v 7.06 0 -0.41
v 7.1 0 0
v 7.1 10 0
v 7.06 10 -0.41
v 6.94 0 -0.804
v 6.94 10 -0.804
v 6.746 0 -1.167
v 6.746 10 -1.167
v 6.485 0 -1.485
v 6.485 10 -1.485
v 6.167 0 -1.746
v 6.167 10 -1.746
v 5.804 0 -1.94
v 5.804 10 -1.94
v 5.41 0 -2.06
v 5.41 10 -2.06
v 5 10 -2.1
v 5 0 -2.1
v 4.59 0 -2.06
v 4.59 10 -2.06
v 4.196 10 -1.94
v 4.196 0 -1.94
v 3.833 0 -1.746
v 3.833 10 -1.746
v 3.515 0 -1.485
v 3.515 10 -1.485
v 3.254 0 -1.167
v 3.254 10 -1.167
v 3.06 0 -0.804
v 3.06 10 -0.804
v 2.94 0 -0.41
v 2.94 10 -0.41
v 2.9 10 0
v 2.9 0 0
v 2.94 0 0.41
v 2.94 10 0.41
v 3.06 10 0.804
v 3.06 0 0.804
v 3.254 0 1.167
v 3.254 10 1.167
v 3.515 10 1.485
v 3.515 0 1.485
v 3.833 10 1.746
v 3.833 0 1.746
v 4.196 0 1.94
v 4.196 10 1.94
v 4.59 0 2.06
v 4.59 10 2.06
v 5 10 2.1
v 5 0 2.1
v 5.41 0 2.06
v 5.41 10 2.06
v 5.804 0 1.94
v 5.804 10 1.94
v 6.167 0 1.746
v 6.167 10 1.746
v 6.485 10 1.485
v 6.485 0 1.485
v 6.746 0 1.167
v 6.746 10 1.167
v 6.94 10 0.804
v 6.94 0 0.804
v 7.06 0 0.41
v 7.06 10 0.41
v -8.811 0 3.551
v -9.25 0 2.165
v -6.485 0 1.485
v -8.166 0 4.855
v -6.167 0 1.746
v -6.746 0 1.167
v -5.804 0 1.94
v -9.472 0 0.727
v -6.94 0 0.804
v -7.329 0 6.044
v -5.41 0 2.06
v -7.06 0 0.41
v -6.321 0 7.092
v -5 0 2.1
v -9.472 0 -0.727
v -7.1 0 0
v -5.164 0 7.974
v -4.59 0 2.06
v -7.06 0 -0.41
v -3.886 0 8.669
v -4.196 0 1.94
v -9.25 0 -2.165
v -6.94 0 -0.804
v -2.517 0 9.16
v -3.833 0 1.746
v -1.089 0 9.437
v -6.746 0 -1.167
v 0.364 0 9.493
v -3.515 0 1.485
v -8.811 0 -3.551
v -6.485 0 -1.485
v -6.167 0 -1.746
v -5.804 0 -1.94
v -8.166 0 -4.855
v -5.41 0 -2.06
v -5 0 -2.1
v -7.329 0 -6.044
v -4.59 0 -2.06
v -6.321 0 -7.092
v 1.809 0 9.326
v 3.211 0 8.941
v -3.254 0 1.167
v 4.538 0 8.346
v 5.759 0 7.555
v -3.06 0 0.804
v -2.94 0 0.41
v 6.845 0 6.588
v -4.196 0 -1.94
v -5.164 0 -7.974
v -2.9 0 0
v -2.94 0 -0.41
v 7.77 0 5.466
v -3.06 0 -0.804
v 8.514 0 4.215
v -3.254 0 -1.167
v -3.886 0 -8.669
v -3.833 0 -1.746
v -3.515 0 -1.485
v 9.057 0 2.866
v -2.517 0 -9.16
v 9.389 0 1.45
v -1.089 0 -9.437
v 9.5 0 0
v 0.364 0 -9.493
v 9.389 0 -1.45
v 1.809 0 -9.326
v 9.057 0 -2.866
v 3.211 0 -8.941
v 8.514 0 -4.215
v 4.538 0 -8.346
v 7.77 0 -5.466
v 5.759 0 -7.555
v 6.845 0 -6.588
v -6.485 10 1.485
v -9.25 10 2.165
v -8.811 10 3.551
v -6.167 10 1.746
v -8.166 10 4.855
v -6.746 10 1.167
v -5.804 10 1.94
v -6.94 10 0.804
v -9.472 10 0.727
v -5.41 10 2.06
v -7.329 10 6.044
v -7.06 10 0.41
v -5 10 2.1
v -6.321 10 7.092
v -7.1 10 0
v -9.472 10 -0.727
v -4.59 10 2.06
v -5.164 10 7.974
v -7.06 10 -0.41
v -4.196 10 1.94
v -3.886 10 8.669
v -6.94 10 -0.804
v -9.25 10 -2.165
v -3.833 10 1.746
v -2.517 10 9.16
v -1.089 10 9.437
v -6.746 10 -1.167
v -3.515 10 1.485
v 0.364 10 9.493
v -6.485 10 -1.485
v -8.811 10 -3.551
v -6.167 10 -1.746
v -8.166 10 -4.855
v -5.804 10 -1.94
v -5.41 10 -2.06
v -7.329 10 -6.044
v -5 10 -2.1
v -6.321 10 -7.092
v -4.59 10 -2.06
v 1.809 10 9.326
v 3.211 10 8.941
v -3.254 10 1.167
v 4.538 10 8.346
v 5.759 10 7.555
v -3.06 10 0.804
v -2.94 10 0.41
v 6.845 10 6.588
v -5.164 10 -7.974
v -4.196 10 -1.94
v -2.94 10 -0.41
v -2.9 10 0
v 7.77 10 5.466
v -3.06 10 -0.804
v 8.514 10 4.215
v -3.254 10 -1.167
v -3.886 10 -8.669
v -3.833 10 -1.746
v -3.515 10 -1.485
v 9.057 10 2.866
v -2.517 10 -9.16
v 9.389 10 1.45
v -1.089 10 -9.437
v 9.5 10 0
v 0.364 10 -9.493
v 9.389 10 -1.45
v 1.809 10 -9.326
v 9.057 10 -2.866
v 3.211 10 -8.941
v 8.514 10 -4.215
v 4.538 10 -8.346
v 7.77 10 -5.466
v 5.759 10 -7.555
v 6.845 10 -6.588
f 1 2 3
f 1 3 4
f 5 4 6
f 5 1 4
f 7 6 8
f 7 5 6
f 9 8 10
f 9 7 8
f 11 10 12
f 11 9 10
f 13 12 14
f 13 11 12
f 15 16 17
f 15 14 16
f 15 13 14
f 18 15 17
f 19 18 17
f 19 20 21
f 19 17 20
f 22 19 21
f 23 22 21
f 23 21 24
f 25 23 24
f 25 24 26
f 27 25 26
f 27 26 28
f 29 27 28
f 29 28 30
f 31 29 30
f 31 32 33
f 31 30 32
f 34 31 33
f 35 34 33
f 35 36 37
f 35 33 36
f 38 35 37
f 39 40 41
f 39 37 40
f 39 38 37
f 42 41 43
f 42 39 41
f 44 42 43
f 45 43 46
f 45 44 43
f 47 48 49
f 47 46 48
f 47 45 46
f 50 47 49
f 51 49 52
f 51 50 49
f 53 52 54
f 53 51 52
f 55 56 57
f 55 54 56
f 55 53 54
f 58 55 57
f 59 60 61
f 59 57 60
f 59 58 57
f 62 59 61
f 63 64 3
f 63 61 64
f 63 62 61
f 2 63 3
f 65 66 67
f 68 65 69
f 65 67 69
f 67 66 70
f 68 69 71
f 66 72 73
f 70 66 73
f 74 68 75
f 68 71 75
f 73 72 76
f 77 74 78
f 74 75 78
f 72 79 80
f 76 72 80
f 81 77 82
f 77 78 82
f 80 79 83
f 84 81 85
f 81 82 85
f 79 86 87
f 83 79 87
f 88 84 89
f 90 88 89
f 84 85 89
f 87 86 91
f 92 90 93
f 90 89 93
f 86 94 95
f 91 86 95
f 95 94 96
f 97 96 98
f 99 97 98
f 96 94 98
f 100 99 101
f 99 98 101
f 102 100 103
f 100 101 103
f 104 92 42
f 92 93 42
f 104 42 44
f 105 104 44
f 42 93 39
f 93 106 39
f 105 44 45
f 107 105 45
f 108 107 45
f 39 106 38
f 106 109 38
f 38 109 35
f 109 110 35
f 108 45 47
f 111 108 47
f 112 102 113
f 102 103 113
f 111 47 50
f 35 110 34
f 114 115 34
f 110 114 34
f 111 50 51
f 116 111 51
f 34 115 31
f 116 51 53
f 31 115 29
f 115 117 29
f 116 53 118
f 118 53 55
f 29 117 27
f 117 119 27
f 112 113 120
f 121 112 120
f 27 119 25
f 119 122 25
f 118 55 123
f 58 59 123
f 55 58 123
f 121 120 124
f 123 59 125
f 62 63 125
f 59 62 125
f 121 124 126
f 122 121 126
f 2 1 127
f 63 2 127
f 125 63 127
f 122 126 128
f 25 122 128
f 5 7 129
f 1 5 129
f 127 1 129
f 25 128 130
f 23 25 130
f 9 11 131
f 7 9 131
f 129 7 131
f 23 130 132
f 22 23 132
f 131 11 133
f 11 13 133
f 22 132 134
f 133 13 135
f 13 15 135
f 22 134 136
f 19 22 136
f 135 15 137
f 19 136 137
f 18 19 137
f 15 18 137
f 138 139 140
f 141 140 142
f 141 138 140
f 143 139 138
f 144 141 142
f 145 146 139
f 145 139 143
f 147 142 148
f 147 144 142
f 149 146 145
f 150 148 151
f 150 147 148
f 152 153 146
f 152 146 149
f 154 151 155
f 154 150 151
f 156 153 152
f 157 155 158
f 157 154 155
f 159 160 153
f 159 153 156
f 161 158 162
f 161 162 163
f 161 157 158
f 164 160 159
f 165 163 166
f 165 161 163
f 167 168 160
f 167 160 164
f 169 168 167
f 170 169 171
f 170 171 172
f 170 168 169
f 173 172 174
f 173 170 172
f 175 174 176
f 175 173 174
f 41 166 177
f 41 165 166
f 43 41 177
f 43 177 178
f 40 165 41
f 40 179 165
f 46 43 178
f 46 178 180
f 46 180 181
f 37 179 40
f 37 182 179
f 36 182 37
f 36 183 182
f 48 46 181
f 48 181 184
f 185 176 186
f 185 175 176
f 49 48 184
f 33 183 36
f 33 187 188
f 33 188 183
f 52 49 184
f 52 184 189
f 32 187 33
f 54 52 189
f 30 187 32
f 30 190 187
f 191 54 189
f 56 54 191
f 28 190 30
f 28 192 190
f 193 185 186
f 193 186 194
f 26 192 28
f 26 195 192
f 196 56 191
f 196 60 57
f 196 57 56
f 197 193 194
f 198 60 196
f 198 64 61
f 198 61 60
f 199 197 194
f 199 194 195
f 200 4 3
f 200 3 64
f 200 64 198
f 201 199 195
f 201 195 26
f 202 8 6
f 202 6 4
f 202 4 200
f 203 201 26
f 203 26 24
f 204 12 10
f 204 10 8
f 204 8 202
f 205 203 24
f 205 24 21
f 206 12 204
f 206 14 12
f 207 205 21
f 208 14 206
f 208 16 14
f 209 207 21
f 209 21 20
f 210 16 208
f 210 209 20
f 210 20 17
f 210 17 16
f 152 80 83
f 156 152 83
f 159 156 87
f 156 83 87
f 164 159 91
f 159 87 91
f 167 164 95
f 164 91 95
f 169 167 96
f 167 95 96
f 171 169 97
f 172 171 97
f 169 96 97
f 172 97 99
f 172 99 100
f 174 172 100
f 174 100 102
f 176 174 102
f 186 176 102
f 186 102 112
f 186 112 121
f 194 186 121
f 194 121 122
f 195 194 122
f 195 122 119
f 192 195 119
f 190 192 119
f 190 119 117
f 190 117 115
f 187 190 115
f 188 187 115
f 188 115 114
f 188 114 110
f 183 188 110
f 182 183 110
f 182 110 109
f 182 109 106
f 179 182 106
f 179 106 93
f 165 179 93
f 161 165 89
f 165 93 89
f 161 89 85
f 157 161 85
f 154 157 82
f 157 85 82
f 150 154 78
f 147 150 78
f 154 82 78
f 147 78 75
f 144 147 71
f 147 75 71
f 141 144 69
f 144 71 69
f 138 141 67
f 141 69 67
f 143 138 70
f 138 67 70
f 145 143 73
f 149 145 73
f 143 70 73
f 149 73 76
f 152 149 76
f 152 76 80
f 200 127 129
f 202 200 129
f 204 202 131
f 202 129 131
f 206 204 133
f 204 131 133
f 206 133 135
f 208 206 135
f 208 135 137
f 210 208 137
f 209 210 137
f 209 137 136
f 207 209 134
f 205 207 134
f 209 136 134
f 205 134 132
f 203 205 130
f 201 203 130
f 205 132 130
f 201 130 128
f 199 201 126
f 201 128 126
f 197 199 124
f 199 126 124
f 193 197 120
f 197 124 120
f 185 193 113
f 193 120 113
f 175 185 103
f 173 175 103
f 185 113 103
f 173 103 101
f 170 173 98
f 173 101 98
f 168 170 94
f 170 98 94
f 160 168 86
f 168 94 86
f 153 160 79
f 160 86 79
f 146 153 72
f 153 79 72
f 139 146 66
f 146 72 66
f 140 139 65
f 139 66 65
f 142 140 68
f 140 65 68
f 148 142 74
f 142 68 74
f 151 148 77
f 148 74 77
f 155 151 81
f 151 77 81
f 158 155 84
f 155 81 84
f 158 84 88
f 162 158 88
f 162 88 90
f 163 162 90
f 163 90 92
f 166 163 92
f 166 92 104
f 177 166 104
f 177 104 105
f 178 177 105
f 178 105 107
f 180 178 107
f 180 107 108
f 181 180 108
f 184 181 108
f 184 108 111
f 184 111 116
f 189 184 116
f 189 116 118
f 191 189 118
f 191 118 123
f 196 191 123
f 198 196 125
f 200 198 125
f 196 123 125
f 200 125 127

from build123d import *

# Parameters (mm, degrees)
SKETCH1_R           = 9.5
BOSS_EXTRUDE1_DEPTH = 10
CUT_EXTRUDE1_START  = -11
SKETCH2_R           = 2.1
CUT_EXTRUDE1_DEPTH  = 12


with BuildPart() as part:
    # Sketch1 → Boss-Extrude1 (new body)
    with BuildSketch(Plane(origin=(0, 0, 0), x_dir=(1, 0, 0), z_dir=(0, 1, 0))):
        Circle(SKETCH1_R)
    extrude(amount=BOSS_EXTRUDE1_DEPTH)

    # Sketch2 → Cut-Extrude1 (cut)
    with BuildSketch(Plane(origin=(0, 10, 0), x_dir=(1, 0, 0), z_dir=(0, 1, 0)).offset(CUT_EXTRUDE1_START)):
        with Locations((5, 0)):
            Circle(SKETCH2_R)
    cut_extrude1 = extrude(amount=CUT_EXTRUDE1_DEPTH, mode=Mode.SUBTRACT)

    # Mirror1: Cut-Extrude1 across plane
    add(cut_extrude1.mirror(Plane(origin=(0, 0, 0), x_dir=(0, 0, 1), z_dir=(1, 0, 0))), mode=Mode.SUBTRACT)


solid = part.part
